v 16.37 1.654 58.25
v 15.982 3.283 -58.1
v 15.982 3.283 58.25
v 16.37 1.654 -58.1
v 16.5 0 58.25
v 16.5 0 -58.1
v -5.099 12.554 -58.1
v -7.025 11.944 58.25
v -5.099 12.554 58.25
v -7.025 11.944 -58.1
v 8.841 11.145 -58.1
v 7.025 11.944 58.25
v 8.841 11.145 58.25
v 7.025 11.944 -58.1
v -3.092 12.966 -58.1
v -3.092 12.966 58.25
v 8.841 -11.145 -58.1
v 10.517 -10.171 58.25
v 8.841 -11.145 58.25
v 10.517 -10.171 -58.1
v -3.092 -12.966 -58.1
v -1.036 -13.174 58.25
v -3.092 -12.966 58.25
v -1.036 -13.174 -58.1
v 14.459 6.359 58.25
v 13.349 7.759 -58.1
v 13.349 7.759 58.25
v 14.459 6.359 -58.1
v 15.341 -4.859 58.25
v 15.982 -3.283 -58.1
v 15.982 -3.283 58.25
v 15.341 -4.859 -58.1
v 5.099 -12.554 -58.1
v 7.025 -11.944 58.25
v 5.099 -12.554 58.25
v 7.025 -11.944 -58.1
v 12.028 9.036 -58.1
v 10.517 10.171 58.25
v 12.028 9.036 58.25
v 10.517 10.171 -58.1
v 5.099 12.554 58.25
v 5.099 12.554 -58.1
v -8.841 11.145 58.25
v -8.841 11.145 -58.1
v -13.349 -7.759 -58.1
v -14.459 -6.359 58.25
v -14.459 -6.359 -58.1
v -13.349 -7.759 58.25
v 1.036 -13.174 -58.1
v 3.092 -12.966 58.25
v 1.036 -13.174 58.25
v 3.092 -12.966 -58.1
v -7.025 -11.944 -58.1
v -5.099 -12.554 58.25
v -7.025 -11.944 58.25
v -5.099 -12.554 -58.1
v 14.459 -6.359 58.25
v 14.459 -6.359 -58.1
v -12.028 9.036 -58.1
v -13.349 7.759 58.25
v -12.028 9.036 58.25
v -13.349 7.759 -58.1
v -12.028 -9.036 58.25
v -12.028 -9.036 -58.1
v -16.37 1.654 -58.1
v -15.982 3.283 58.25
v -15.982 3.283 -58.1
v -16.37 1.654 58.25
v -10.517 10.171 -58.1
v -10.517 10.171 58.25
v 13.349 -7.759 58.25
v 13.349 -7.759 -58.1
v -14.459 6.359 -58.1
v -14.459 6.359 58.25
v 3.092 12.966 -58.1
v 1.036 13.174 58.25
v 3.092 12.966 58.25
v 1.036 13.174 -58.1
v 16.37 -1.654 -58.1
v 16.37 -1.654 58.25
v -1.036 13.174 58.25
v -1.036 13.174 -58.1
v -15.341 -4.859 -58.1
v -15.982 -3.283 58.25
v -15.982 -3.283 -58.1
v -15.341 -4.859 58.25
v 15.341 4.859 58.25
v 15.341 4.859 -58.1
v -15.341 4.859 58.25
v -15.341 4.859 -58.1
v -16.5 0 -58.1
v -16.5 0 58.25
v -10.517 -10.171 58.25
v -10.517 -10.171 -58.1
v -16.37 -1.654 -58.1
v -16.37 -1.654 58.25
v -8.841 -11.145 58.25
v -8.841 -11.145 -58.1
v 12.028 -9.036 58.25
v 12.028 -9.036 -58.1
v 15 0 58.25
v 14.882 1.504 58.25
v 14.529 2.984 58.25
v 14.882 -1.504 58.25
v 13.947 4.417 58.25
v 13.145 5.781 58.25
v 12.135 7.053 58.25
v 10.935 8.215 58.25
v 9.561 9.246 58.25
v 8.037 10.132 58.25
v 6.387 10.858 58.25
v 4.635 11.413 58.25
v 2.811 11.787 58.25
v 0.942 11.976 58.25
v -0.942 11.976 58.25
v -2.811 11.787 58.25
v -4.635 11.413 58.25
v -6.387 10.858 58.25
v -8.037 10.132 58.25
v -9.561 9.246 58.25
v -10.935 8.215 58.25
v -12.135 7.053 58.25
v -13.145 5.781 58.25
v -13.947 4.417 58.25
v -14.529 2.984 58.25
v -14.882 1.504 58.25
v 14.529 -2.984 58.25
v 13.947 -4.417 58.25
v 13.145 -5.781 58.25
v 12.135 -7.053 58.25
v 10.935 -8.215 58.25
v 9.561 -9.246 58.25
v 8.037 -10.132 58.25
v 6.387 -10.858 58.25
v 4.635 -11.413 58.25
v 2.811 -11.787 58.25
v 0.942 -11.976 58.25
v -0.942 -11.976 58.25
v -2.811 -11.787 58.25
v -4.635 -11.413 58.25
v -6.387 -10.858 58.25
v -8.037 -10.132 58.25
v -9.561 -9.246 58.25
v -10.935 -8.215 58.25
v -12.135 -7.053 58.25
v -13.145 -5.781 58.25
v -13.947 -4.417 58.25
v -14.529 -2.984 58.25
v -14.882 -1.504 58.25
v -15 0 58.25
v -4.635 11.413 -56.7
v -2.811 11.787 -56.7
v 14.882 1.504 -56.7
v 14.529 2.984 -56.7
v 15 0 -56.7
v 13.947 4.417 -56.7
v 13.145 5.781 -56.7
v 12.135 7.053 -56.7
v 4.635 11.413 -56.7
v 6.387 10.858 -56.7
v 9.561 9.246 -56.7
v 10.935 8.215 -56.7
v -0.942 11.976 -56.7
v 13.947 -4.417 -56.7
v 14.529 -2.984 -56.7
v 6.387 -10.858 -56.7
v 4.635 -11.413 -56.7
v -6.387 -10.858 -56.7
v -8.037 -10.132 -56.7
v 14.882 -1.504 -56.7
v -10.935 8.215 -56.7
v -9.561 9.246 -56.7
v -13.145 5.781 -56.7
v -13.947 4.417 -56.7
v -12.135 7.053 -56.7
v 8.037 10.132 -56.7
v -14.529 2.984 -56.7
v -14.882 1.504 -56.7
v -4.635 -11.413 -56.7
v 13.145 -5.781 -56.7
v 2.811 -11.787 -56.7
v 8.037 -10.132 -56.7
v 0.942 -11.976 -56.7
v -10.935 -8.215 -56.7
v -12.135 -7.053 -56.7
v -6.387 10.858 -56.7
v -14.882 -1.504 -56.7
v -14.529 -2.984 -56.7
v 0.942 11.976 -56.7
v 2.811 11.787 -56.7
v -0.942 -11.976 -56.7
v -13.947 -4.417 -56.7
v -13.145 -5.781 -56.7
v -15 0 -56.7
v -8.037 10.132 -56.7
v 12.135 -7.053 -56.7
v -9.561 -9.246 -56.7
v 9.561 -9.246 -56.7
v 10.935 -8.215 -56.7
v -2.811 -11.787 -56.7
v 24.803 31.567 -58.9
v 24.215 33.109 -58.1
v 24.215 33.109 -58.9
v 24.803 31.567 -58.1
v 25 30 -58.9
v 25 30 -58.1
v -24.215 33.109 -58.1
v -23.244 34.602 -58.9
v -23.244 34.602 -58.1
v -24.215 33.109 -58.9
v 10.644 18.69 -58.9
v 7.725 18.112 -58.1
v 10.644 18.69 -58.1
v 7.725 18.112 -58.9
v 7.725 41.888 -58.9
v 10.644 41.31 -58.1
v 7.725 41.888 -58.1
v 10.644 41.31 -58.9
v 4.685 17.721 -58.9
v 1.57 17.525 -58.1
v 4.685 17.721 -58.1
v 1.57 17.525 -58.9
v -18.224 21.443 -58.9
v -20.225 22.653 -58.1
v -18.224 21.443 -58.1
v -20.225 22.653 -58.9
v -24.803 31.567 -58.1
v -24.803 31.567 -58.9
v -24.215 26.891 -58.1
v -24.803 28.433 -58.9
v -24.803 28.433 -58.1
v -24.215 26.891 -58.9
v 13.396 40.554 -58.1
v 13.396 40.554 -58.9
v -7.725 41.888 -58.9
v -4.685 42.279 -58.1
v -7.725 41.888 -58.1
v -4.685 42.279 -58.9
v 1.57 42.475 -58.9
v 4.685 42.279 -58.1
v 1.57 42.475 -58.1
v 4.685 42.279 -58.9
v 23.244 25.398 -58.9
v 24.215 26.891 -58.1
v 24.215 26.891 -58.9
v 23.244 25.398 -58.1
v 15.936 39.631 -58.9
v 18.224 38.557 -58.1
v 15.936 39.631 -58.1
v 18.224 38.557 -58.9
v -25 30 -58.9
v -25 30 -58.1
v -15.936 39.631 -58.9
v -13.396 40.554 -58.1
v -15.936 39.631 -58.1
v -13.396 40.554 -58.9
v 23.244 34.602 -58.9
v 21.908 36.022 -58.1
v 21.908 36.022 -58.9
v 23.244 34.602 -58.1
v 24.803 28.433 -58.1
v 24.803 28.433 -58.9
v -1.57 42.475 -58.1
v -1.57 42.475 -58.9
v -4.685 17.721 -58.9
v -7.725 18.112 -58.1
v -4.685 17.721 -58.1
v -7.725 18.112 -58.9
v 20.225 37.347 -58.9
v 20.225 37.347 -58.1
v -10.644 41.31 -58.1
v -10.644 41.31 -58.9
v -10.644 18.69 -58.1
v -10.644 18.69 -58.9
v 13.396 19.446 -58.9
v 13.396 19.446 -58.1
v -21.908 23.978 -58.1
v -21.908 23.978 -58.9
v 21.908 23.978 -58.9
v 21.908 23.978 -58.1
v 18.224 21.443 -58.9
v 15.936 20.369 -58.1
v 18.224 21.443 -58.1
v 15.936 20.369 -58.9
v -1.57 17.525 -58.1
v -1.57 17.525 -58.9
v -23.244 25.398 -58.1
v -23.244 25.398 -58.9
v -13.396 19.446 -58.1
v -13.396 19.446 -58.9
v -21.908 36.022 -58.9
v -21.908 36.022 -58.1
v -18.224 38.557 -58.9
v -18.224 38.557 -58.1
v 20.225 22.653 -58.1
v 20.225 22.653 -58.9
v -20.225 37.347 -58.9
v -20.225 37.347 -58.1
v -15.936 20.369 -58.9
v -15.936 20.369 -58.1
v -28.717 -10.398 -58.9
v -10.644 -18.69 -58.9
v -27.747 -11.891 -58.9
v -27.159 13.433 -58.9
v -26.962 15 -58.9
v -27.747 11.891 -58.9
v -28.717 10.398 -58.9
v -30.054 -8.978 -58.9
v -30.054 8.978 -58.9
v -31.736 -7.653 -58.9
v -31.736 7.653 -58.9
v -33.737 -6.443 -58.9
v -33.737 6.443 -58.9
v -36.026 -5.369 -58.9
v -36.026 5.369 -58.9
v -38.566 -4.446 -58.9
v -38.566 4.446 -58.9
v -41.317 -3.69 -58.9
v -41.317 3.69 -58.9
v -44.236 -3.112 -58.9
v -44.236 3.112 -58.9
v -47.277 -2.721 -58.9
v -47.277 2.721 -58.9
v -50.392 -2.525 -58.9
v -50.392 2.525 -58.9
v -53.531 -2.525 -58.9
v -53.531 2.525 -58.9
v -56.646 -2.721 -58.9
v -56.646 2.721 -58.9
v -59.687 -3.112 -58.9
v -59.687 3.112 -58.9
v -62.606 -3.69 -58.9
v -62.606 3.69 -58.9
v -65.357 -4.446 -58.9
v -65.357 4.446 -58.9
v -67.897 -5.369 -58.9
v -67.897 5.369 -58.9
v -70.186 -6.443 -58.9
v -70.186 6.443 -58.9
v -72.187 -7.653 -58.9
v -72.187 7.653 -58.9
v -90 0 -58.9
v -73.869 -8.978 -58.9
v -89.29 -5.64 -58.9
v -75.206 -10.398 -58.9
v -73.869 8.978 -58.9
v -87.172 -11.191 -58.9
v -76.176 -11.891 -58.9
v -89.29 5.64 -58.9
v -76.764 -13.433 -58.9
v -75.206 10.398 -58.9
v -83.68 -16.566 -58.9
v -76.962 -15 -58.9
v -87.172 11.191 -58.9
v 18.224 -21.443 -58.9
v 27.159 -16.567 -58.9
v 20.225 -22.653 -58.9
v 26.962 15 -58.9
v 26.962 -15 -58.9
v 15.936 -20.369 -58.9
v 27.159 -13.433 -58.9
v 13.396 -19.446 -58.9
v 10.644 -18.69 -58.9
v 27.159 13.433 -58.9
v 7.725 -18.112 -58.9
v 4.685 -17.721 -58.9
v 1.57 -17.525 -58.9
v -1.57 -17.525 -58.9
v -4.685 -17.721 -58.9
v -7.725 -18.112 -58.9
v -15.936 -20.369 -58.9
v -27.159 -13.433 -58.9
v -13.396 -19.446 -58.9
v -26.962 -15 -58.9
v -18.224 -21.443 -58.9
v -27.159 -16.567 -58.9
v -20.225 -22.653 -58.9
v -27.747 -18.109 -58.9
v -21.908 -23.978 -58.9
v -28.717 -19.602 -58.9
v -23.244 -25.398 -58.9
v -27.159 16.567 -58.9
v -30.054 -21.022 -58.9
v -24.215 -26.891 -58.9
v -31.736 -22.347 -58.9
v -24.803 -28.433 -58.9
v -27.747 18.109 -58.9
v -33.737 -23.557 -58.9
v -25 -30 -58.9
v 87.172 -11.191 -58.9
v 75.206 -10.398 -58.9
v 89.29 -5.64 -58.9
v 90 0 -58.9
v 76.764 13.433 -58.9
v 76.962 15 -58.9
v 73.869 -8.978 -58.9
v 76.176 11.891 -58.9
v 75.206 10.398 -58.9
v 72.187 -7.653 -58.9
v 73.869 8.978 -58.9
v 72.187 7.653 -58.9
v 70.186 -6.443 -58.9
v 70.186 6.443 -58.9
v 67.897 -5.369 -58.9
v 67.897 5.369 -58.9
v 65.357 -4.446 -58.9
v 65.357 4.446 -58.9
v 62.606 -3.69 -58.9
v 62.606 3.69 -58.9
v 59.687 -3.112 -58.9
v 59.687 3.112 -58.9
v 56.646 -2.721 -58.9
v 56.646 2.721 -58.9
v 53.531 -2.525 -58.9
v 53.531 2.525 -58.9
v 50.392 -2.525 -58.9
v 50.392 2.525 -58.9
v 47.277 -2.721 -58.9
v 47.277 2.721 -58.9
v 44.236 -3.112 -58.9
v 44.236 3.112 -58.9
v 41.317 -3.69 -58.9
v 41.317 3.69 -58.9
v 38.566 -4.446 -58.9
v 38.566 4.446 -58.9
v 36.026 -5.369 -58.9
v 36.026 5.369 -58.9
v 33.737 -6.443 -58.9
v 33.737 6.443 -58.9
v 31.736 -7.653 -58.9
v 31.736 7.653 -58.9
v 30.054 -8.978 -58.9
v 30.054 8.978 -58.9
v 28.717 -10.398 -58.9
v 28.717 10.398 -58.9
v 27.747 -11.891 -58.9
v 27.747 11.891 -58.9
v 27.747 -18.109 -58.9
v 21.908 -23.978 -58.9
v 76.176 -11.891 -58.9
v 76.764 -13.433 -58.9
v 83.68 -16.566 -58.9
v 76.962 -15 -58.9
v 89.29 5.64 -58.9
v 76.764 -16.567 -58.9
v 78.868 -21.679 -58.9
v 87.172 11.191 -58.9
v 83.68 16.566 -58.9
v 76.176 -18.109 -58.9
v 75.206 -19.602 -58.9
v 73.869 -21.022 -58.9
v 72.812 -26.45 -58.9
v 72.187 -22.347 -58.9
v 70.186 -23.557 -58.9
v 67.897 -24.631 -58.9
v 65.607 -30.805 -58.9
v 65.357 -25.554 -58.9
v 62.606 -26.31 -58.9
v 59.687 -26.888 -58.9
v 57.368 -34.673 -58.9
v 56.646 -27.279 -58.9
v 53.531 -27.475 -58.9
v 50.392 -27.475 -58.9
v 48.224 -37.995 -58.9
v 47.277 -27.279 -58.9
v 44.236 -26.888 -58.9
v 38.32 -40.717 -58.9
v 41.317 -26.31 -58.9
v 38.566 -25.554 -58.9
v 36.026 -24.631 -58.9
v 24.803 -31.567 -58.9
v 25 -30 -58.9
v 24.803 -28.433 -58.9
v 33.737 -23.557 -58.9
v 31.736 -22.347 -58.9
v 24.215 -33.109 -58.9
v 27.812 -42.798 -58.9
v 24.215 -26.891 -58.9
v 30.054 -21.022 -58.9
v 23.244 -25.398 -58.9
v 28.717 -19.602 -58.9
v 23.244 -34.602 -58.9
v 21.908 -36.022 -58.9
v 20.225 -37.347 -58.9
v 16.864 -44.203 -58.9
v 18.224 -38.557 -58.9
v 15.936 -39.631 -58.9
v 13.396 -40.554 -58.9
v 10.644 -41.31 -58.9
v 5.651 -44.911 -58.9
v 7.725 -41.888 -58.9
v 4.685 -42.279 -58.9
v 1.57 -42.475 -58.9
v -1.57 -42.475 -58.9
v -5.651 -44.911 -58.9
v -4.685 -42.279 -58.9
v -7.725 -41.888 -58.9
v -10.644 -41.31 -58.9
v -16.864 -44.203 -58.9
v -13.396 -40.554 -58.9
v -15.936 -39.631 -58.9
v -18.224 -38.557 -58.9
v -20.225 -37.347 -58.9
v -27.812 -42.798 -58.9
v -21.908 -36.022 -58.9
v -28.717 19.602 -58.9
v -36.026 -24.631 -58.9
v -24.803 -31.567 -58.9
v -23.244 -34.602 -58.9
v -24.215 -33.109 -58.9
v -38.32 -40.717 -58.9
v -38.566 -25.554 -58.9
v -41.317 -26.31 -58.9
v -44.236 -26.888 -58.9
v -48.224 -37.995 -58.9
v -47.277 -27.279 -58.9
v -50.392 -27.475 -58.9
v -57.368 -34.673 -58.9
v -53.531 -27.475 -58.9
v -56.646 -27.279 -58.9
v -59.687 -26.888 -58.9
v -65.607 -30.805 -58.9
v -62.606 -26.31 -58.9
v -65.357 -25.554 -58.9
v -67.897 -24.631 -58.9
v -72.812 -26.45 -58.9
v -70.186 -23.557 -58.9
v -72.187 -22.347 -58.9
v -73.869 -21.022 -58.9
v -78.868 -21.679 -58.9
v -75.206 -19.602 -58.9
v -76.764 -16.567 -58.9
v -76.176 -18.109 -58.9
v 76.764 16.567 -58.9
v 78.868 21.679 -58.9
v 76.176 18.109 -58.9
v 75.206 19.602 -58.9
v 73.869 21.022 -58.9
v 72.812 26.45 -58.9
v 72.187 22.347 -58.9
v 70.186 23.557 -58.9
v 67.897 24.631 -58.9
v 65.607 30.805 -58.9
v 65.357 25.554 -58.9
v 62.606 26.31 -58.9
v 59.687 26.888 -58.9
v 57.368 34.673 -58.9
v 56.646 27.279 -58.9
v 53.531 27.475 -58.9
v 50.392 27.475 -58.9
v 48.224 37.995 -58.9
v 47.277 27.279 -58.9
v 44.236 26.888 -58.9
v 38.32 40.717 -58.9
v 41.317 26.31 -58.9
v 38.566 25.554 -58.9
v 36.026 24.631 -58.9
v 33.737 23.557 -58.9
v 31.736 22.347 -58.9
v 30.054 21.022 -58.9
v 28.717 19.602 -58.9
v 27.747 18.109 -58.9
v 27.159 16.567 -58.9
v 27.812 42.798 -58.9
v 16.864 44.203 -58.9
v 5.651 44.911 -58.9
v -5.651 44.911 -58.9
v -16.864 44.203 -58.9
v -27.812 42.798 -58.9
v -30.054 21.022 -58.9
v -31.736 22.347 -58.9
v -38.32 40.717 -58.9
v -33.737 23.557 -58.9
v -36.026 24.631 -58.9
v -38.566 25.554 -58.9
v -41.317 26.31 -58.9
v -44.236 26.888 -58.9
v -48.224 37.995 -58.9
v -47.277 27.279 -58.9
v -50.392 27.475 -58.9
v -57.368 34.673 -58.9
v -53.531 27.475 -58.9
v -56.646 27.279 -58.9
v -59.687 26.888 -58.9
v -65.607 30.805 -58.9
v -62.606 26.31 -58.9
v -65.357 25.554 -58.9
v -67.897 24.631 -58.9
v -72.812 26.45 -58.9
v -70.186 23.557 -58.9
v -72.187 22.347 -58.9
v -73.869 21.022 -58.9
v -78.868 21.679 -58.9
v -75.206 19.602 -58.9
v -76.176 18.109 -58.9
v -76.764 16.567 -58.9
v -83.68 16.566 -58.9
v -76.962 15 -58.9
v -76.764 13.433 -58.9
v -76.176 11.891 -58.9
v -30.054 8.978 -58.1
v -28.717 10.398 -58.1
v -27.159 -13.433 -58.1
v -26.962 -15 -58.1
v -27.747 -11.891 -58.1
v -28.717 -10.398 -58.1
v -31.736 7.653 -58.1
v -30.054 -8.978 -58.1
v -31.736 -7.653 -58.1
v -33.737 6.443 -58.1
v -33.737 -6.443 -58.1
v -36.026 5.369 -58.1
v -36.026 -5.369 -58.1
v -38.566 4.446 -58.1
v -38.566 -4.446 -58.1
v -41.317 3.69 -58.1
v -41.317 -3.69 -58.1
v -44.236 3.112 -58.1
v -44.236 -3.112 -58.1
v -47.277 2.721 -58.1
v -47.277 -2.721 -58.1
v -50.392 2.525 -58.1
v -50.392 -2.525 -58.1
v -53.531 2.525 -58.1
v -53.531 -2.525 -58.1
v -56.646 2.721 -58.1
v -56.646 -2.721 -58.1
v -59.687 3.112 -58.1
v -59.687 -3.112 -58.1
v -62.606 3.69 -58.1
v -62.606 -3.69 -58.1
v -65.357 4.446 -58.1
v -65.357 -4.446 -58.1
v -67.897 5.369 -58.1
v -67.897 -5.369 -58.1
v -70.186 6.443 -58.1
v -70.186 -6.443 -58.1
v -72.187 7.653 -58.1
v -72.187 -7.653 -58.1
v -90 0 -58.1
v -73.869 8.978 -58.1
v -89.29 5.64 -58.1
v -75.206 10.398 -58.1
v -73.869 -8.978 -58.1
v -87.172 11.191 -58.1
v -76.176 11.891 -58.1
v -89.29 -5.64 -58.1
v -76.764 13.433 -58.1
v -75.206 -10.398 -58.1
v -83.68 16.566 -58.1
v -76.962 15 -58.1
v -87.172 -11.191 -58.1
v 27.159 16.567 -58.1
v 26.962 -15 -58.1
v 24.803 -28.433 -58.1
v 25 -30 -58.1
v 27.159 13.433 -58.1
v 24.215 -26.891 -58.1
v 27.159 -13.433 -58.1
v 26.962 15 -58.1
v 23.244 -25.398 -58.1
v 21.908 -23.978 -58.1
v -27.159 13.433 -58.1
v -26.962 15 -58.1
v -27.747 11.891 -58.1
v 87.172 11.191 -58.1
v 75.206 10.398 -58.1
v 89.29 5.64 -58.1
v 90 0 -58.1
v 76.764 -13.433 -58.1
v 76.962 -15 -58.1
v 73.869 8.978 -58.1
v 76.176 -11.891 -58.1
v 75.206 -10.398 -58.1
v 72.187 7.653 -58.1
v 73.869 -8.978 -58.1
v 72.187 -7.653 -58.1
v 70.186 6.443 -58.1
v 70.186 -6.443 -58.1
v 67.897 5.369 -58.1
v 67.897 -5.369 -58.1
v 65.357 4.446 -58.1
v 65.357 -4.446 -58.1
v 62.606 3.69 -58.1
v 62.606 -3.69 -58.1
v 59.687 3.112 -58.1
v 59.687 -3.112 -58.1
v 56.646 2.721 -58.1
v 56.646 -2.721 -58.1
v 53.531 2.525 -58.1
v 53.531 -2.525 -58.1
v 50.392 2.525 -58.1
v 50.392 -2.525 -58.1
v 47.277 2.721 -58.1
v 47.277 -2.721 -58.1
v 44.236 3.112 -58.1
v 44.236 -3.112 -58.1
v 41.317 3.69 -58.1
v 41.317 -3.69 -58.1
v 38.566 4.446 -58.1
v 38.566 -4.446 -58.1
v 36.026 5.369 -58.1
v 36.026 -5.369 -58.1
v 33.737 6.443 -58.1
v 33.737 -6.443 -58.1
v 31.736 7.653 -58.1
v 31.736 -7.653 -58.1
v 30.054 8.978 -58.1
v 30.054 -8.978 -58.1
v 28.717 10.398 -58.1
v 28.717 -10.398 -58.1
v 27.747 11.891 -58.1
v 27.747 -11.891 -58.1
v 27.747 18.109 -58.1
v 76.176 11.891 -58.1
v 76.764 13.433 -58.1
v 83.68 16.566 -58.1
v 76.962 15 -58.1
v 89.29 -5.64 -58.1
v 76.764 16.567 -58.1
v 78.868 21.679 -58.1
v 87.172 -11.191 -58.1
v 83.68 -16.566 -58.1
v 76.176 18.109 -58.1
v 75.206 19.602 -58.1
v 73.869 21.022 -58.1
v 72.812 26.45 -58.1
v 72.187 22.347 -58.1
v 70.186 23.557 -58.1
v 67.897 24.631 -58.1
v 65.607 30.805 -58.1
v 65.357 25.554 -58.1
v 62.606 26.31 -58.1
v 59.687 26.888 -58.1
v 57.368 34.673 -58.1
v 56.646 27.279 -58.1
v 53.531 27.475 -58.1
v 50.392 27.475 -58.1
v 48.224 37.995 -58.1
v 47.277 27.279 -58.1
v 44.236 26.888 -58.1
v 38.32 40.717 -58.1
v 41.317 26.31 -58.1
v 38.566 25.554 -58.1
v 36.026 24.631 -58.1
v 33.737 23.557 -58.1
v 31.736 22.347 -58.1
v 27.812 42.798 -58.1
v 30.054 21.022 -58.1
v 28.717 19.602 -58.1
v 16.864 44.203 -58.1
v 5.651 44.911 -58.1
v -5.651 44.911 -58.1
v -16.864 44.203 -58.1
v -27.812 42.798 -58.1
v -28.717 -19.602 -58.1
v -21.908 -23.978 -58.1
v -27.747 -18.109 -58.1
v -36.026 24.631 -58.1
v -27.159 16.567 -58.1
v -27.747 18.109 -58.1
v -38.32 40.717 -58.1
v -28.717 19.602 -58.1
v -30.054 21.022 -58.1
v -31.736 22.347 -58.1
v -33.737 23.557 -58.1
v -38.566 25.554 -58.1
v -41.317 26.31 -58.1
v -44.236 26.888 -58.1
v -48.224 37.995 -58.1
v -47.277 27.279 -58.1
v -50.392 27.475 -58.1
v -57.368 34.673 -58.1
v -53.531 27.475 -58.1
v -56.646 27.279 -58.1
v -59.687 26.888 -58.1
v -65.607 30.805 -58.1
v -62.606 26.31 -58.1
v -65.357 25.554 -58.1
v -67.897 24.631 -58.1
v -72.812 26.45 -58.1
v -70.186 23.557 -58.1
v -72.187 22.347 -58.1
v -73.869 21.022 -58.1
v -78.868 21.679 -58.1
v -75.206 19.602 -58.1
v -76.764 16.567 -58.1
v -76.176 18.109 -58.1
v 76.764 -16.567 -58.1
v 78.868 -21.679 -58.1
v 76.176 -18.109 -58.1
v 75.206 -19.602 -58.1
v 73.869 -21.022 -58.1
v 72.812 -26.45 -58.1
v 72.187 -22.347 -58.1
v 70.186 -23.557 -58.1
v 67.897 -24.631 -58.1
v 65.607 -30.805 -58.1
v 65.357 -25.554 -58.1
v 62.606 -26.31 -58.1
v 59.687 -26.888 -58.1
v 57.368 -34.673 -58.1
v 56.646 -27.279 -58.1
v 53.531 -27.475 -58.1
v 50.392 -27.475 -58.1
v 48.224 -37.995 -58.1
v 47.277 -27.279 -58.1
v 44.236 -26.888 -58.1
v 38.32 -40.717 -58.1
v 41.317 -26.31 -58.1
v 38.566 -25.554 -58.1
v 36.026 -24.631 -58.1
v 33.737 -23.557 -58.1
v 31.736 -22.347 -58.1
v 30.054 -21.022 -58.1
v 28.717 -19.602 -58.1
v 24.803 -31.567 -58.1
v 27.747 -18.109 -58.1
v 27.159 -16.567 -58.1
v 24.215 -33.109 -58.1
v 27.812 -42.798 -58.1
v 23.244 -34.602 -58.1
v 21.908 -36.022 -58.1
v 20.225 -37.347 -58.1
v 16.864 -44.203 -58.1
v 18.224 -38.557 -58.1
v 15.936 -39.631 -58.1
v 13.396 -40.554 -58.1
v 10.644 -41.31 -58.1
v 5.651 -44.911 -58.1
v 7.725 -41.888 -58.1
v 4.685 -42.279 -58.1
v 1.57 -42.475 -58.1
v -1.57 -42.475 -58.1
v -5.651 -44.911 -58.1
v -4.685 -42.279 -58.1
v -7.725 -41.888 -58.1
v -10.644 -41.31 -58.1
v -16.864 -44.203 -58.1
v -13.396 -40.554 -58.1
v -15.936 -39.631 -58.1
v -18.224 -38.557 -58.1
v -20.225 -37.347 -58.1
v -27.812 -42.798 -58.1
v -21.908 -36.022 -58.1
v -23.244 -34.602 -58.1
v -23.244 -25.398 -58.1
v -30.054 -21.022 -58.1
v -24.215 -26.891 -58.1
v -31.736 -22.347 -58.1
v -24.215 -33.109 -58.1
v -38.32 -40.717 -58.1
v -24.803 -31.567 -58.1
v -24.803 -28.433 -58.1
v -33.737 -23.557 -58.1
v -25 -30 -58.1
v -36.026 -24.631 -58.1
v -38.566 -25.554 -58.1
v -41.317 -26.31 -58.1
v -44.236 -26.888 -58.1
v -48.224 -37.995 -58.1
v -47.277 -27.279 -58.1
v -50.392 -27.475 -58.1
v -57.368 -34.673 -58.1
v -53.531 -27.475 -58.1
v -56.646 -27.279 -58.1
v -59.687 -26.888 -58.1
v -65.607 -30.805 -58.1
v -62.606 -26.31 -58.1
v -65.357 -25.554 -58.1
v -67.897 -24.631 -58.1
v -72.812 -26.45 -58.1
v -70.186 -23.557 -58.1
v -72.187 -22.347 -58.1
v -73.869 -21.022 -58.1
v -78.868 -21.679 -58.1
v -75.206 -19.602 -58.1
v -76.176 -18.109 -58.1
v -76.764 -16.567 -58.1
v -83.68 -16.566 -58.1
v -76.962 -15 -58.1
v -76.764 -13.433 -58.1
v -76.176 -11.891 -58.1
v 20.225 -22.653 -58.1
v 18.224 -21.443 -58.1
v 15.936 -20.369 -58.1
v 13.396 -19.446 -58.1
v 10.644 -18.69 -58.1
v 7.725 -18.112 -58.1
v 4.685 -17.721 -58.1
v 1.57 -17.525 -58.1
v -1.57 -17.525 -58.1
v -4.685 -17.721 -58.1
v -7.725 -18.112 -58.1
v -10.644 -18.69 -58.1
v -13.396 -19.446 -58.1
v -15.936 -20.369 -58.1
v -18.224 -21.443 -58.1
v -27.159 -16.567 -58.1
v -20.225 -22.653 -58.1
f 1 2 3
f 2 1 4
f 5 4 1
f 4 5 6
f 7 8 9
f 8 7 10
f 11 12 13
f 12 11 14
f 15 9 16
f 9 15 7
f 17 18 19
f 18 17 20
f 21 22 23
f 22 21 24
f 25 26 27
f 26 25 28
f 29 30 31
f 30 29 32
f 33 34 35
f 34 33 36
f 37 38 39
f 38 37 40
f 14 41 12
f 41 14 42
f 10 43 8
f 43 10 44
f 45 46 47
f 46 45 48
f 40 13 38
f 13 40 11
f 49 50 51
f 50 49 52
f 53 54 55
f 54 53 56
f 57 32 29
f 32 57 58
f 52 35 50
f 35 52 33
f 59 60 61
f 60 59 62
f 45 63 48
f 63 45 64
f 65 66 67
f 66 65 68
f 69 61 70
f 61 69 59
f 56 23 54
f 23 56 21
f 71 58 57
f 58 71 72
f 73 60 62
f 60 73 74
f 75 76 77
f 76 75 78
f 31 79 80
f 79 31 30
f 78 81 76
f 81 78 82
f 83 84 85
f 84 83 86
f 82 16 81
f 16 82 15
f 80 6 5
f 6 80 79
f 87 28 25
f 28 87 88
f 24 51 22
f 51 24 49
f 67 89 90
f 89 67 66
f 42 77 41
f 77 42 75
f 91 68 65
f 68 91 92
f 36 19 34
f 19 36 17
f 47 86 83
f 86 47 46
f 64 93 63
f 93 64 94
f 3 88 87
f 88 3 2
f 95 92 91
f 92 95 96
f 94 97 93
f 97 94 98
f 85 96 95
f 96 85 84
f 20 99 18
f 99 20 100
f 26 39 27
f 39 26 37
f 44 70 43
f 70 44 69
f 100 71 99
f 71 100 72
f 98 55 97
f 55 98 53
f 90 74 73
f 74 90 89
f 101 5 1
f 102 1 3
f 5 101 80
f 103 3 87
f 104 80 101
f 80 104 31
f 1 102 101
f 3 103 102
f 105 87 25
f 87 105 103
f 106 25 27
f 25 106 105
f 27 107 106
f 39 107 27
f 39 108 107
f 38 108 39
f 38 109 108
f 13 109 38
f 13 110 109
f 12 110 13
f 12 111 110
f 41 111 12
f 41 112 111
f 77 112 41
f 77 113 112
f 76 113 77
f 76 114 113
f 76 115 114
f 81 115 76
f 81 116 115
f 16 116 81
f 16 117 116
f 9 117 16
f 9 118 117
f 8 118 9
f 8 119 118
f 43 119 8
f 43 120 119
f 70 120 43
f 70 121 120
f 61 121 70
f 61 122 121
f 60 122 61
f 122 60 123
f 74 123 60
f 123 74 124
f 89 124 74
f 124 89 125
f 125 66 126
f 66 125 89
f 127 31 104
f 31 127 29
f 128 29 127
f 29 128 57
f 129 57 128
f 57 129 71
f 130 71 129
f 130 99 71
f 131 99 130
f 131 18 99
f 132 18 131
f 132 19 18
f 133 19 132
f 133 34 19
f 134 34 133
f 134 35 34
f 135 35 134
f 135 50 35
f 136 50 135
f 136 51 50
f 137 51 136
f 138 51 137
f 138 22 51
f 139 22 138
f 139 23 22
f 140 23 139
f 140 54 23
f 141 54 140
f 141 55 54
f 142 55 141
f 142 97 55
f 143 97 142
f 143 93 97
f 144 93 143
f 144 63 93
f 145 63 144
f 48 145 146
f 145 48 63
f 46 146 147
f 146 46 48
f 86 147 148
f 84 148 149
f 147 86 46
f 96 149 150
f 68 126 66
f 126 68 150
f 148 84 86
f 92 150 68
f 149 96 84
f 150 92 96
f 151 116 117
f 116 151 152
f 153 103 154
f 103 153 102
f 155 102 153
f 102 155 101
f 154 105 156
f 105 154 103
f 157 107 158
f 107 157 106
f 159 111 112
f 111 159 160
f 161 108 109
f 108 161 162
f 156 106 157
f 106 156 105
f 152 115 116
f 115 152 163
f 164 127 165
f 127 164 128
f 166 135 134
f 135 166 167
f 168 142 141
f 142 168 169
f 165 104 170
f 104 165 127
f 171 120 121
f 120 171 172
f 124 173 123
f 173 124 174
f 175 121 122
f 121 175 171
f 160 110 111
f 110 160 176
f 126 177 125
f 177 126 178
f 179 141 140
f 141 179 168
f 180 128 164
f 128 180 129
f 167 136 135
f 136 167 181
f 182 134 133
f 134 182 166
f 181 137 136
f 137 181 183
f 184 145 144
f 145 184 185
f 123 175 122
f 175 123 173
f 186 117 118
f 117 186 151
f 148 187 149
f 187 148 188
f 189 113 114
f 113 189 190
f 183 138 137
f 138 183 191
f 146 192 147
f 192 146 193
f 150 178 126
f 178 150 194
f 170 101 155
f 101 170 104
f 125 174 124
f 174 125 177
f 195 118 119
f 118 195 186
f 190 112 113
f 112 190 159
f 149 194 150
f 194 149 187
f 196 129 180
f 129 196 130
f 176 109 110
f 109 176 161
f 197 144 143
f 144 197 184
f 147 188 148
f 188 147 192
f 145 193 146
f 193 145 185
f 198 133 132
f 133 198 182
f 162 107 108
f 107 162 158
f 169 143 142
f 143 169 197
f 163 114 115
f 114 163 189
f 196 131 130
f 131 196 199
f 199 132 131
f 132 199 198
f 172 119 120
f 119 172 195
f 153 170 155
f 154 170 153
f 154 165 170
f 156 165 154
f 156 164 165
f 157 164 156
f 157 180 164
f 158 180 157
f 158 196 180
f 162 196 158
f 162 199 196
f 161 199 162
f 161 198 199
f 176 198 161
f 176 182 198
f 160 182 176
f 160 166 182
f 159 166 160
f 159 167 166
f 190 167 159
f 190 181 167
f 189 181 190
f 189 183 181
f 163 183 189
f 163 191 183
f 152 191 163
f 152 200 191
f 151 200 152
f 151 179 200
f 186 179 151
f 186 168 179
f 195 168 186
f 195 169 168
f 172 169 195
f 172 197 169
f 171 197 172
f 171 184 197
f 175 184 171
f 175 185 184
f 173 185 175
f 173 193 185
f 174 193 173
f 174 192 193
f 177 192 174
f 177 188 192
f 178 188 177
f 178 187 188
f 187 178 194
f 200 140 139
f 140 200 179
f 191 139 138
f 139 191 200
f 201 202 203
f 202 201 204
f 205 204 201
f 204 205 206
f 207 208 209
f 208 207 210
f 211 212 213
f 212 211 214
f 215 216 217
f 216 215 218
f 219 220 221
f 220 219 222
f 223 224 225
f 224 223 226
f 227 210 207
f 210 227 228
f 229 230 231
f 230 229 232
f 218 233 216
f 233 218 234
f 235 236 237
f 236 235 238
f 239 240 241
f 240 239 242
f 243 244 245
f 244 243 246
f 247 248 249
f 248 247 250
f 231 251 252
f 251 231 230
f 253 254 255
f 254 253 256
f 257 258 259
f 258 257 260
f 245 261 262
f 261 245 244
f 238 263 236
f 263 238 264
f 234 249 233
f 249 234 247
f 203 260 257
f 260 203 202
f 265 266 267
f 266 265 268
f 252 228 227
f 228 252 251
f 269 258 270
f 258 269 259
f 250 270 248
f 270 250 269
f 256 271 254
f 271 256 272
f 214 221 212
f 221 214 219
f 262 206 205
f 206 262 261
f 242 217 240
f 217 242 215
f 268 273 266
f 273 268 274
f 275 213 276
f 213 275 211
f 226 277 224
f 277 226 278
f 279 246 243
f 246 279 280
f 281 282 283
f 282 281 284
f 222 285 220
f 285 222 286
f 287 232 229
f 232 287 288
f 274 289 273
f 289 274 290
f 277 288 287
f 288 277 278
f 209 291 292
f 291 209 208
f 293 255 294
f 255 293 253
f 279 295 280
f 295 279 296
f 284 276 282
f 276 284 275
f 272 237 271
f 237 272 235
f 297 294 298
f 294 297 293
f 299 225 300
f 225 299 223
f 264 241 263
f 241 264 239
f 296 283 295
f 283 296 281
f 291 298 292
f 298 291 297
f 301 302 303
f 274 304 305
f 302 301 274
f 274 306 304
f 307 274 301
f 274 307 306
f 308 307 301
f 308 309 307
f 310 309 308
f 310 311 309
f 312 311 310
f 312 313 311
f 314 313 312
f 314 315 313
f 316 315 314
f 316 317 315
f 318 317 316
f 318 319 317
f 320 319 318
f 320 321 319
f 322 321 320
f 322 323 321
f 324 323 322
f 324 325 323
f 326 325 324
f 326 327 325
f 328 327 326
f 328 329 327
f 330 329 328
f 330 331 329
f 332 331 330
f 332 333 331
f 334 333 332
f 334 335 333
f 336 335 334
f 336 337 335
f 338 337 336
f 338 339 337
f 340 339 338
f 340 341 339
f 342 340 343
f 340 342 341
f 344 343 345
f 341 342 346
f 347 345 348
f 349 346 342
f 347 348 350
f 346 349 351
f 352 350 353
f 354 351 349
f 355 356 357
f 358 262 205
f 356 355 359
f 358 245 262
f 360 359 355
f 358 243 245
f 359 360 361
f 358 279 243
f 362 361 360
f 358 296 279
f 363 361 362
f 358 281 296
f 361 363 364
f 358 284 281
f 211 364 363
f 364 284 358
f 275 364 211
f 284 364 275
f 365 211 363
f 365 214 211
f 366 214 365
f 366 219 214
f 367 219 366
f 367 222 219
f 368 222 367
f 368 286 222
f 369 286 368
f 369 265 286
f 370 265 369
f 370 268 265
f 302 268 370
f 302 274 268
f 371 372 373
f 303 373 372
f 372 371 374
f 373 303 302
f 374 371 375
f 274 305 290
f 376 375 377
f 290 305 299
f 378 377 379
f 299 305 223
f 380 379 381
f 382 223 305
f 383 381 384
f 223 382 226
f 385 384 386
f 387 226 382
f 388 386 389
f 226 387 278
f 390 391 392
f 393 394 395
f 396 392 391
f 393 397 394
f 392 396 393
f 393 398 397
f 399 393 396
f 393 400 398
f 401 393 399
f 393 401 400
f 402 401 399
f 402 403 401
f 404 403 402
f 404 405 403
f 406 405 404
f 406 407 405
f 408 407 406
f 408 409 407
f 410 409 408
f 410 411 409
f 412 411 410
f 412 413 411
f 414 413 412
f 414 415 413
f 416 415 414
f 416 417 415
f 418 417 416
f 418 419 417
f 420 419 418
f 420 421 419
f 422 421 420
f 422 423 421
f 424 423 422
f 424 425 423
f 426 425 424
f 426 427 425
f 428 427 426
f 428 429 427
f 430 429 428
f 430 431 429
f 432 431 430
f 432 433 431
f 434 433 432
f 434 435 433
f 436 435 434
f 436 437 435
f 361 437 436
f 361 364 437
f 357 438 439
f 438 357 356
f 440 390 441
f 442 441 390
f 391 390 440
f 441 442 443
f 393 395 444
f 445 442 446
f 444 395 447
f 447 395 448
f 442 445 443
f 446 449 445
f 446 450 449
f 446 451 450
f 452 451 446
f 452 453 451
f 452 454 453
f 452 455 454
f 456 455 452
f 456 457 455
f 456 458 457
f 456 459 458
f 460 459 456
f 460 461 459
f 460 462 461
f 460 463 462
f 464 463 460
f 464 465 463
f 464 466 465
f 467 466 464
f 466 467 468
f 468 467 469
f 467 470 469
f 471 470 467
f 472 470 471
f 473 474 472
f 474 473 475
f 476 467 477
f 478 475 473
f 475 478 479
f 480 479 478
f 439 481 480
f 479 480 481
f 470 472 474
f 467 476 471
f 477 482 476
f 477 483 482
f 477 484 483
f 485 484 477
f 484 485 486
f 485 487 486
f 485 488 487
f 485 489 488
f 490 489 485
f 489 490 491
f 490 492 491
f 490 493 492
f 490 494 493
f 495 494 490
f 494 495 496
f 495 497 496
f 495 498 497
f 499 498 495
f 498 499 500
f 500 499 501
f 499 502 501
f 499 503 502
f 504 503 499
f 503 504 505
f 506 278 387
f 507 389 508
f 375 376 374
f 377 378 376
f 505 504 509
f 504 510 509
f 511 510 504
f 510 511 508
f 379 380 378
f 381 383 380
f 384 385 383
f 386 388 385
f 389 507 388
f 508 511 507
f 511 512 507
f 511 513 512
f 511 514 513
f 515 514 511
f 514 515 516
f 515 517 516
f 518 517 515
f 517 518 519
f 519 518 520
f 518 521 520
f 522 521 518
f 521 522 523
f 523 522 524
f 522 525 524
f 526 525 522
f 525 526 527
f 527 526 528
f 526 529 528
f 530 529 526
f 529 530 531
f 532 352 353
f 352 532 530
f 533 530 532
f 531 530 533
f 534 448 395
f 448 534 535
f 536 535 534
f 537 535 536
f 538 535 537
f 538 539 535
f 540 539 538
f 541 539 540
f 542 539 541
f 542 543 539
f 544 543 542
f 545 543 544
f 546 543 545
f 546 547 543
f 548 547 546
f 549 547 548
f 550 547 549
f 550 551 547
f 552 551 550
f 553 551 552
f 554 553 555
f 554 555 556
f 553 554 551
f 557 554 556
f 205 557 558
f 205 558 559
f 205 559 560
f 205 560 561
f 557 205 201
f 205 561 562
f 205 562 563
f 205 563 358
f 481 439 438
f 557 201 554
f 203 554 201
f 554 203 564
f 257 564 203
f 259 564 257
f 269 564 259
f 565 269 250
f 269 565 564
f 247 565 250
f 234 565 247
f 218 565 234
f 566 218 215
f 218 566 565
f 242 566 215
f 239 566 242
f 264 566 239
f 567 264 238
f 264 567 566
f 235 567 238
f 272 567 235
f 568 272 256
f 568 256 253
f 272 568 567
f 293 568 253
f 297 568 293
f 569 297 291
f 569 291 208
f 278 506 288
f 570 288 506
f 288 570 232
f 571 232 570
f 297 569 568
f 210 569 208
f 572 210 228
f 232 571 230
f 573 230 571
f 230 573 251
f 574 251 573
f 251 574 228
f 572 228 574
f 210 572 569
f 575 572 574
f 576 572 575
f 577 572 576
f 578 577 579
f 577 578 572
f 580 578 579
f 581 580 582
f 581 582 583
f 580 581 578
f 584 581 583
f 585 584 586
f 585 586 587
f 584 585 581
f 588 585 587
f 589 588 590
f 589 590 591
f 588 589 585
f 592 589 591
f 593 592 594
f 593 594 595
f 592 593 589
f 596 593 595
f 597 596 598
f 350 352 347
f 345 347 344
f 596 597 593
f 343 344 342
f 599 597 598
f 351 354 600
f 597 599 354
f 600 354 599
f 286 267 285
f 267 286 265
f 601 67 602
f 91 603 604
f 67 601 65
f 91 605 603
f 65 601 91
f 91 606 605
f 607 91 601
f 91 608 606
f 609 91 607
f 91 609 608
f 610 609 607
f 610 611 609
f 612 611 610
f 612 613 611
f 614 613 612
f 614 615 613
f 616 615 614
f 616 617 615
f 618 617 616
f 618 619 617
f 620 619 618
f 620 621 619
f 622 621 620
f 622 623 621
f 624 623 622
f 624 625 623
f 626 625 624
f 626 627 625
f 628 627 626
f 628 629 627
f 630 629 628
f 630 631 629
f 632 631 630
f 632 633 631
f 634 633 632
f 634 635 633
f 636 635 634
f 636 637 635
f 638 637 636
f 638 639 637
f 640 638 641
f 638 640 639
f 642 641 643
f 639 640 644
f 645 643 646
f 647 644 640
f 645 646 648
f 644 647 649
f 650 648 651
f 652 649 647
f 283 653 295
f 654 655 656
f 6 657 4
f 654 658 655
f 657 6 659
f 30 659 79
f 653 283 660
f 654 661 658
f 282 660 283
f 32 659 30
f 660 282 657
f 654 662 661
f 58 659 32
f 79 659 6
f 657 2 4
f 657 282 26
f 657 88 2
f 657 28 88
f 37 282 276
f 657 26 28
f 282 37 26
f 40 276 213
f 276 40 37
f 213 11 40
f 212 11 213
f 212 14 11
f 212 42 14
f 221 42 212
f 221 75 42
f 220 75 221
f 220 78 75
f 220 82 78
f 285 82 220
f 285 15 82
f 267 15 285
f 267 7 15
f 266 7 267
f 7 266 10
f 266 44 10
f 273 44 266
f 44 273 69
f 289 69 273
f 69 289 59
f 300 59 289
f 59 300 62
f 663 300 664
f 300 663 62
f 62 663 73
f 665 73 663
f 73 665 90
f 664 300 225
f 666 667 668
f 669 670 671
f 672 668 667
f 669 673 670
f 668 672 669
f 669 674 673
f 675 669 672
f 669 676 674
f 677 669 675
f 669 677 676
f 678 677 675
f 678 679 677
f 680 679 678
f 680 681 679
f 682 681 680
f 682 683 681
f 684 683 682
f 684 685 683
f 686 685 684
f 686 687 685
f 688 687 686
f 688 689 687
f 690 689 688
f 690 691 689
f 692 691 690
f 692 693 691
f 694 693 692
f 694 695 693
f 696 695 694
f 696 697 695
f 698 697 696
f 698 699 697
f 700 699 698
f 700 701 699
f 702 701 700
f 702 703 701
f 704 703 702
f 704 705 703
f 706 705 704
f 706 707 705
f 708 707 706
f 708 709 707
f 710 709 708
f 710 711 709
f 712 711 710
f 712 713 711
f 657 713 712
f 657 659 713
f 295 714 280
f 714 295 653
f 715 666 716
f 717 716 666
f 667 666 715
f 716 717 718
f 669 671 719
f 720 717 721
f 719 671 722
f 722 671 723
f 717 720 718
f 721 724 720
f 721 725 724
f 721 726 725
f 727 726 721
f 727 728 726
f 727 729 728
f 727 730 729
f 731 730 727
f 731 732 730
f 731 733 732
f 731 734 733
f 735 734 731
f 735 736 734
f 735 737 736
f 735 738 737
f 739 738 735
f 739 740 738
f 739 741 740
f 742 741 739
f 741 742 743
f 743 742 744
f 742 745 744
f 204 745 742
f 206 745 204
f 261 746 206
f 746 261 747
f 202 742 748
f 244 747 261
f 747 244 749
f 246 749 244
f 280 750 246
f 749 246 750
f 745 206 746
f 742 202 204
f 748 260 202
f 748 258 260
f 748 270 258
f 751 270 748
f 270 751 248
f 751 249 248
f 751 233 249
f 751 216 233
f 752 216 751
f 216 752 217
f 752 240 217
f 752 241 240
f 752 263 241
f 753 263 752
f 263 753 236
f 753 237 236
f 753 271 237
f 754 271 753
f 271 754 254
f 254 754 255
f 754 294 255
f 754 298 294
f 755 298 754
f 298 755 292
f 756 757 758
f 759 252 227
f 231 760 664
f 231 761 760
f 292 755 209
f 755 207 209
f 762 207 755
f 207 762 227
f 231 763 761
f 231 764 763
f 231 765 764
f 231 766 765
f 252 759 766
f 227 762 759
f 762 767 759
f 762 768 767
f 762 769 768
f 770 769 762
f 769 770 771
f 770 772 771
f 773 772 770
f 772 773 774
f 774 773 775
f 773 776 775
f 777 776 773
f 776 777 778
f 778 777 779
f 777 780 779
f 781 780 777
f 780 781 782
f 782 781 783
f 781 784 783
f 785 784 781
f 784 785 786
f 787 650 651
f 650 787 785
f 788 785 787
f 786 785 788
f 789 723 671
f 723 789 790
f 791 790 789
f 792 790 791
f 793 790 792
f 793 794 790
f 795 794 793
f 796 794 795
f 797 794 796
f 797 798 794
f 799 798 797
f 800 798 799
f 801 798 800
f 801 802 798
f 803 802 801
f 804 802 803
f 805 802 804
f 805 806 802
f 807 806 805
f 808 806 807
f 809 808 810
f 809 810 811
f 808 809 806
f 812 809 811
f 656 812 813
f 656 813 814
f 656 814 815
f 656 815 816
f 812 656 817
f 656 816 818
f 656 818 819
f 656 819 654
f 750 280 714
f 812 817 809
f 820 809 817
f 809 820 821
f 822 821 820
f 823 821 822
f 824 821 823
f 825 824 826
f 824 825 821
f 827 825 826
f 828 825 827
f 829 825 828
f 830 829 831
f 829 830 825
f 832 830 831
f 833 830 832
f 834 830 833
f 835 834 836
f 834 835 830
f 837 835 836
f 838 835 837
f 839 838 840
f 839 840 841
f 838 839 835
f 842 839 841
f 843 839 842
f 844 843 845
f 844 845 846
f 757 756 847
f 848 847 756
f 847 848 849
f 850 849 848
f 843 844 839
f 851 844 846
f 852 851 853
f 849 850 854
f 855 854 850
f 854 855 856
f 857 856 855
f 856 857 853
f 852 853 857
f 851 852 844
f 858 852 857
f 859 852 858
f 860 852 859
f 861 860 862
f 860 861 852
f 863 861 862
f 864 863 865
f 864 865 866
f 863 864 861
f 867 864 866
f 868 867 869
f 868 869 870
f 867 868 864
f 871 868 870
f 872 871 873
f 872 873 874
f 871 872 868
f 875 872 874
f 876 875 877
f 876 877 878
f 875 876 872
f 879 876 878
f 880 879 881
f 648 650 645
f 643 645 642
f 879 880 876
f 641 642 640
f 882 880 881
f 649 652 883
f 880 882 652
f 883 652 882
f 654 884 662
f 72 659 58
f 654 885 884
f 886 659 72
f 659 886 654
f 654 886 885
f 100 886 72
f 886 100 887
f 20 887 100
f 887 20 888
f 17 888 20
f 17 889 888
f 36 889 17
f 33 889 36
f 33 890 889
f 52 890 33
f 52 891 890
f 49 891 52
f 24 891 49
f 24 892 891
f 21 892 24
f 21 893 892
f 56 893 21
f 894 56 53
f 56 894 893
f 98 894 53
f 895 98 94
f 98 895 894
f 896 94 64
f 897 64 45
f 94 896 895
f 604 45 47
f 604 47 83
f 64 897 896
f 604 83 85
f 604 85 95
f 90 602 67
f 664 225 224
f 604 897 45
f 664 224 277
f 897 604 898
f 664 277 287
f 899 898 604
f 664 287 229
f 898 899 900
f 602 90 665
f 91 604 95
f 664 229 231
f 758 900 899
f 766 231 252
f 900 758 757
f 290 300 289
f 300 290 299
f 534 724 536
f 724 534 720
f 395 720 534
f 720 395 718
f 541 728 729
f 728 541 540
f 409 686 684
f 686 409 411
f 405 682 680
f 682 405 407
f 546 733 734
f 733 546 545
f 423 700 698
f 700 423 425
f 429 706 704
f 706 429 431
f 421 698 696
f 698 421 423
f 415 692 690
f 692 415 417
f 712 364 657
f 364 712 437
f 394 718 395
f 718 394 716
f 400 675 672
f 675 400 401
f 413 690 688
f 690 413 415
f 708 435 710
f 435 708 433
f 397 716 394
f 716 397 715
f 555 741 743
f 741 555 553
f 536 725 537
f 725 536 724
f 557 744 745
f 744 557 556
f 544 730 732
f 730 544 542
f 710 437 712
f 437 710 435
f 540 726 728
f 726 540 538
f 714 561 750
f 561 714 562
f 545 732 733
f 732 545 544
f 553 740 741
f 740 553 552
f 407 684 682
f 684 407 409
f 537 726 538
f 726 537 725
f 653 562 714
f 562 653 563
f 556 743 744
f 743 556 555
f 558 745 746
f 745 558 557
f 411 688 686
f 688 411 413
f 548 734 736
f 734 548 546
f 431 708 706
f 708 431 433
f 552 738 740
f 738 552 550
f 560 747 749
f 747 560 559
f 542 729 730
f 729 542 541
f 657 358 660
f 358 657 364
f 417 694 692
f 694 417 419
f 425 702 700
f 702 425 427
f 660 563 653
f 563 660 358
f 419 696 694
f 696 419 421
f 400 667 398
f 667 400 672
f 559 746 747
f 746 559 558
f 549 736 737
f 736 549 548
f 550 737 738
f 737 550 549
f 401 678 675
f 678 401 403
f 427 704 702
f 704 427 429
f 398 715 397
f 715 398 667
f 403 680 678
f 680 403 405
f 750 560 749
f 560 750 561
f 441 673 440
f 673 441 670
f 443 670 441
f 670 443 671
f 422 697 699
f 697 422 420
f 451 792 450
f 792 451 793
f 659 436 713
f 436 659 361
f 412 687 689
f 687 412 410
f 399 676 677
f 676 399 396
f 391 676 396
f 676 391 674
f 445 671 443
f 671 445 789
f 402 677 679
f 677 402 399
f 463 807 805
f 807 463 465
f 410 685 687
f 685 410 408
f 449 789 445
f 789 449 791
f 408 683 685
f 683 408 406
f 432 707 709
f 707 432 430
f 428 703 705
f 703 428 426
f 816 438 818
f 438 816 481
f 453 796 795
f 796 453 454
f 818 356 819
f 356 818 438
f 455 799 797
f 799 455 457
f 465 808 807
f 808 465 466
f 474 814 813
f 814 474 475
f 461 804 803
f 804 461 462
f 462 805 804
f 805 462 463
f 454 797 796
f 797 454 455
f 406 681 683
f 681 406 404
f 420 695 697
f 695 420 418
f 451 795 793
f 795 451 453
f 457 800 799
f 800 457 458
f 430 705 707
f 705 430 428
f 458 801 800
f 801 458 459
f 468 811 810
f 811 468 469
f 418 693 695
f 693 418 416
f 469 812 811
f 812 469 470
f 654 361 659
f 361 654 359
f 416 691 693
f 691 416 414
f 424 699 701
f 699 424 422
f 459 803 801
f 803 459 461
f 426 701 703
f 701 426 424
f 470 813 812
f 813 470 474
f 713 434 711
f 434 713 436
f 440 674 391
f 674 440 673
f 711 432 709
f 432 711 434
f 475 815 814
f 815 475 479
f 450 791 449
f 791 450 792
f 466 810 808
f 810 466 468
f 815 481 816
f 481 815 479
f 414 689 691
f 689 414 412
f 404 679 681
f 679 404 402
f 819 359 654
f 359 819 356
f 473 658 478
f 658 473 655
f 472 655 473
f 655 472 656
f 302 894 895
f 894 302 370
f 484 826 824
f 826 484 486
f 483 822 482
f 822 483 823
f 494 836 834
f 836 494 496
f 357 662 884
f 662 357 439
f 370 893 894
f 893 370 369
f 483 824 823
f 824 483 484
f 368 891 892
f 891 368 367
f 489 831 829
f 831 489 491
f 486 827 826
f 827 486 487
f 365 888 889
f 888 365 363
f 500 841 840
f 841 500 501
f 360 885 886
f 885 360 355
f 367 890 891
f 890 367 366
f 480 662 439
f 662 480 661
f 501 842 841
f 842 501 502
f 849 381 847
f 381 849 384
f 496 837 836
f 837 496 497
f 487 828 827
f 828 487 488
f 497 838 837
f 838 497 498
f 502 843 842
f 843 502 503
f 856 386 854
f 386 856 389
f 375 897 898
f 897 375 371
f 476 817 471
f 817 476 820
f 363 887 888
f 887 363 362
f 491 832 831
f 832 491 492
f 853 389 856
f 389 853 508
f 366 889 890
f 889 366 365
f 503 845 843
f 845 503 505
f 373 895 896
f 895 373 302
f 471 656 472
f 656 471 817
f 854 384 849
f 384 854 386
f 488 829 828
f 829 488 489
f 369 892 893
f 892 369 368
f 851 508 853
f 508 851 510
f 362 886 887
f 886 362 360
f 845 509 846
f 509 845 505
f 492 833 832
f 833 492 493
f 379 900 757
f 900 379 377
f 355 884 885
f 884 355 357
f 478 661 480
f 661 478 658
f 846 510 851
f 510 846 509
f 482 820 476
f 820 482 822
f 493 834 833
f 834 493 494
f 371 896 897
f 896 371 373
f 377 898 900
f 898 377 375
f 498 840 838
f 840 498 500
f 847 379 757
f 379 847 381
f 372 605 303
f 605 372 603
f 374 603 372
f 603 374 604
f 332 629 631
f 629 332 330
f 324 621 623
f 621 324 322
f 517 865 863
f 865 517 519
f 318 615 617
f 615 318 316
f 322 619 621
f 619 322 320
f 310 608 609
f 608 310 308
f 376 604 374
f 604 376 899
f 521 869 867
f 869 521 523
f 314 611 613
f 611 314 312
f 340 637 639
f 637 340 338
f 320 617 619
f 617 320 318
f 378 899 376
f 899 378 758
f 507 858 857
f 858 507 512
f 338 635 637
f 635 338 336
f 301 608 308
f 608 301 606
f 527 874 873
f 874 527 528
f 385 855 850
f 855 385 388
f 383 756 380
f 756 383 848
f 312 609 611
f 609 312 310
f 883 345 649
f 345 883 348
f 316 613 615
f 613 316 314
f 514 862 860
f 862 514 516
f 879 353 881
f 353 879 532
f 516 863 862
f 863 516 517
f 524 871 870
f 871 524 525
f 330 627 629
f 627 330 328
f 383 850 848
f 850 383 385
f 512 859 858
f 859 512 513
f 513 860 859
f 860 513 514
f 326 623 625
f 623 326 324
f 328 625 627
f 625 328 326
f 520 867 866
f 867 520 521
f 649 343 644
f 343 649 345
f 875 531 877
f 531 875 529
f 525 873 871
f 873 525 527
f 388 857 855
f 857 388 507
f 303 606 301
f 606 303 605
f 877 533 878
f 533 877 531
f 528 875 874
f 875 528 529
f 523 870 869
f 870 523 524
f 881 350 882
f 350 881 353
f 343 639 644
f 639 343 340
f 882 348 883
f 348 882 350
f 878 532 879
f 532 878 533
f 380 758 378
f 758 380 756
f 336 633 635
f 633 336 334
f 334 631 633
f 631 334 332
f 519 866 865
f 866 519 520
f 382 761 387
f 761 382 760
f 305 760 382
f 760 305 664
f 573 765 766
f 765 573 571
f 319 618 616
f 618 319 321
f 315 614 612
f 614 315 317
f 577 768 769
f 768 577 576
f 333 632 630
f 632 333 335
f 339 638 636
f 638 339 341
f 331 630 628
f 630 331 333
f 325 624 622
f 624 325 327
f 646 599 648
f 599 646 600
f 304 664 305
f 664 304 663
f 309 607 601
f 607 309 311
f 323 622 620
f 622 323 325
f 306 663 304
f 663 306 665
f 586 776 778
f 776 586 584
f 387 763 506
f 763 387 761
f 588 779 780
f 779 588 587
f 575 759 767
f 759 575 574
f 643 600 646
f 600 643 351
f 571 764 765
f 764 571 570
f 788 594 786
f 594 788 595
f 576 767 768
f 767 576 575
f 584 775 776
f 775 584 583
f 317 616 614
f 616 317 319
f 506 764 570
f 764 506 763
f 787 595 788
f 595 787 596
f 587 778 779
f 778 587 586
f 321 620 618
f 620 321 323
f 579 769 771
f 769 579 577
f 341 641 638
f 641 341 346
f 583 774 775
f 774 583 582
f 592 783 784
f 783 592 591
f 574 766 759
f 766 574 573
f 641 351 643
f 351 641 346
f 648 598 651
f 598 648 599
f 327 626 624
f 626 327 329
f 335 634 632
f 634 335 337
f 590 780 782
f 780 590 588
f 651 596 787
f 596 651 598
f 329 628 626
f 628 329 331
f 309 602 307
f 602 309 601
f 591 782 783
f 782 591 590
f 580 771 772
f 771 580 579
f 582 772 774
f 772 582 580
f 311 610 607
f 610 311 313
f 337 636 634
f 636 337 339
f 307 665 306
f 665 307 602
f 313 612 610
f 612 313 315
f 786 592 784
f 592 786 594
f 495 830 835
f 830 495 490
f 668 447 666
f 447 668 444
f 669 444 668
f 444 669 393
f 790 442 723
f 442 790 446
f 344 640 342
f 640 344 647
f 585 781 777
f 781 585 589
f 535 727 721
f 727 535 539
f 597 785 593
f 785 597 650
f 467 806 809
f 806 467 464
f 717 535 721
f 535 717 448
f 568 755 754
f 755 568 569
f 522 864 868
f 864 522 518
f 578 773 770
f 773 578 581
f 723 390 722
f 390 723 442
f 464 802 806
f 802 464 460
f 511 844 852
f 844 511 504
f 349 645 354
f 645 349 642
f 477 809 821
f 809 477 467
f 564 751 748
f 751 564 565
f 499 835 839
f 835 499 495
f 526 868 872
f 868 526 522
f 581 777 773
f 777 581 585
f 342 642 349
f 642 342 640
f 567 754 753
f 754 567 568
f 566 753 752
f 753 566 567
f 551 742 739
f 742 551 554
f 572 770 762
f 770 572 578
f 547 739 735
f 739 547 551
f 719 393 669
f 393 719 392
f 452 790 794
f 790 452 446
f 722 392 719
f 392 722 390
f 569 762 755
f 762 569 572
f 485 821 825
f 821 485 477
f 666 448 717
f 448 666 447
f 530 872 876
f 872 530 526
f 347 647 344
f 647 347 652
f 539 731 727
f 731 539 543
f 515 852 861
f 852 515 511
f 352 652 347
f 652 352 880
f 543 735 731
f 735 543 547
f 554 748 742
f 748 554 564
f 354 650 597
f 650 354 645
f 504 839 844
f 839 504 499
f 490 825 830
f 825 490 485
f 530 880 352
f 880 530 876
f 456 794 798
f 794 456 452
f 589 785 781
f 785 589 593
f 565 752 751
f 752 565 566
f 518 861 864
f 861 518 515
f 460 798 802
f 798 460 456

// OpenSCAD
/*[Sheat Settings]*/
//in mm
wall_thickness=1.5; //[0.48:0.01:3]
//
width=24; //[1:1:100]
//
height=30; //[1:1:100]
//smoothness
$fn=50; //[30:5:200]
//heigth of sheat in mm
handle_lenght=115; //[10:.1:200]




//handle holder
difference(){
scale([1,width/height,1]){
cylinder(handle_lenght + wall_thickness,d=max(height,width)+2*wall_thickness,center=true);
}
scale([1,width/height,1]){
translate([0,0,0.8])
cylinder(handle_lenght,d=max(height,width),center=true);
}
}

//base
scale([2,1,1]){
translate([0,0,-(handle_lenght/2 +1)]){
difference(){
cylinder(h=0.8,d=3*max(height,width),center=true);
//reduce amount of material required
for( i = [0:60:360])
translate([max(height,width)*sin(i), max(height,width)*cos(i), 0])
cylinder(h=0.8,d=25,center=true);

}
}
}
